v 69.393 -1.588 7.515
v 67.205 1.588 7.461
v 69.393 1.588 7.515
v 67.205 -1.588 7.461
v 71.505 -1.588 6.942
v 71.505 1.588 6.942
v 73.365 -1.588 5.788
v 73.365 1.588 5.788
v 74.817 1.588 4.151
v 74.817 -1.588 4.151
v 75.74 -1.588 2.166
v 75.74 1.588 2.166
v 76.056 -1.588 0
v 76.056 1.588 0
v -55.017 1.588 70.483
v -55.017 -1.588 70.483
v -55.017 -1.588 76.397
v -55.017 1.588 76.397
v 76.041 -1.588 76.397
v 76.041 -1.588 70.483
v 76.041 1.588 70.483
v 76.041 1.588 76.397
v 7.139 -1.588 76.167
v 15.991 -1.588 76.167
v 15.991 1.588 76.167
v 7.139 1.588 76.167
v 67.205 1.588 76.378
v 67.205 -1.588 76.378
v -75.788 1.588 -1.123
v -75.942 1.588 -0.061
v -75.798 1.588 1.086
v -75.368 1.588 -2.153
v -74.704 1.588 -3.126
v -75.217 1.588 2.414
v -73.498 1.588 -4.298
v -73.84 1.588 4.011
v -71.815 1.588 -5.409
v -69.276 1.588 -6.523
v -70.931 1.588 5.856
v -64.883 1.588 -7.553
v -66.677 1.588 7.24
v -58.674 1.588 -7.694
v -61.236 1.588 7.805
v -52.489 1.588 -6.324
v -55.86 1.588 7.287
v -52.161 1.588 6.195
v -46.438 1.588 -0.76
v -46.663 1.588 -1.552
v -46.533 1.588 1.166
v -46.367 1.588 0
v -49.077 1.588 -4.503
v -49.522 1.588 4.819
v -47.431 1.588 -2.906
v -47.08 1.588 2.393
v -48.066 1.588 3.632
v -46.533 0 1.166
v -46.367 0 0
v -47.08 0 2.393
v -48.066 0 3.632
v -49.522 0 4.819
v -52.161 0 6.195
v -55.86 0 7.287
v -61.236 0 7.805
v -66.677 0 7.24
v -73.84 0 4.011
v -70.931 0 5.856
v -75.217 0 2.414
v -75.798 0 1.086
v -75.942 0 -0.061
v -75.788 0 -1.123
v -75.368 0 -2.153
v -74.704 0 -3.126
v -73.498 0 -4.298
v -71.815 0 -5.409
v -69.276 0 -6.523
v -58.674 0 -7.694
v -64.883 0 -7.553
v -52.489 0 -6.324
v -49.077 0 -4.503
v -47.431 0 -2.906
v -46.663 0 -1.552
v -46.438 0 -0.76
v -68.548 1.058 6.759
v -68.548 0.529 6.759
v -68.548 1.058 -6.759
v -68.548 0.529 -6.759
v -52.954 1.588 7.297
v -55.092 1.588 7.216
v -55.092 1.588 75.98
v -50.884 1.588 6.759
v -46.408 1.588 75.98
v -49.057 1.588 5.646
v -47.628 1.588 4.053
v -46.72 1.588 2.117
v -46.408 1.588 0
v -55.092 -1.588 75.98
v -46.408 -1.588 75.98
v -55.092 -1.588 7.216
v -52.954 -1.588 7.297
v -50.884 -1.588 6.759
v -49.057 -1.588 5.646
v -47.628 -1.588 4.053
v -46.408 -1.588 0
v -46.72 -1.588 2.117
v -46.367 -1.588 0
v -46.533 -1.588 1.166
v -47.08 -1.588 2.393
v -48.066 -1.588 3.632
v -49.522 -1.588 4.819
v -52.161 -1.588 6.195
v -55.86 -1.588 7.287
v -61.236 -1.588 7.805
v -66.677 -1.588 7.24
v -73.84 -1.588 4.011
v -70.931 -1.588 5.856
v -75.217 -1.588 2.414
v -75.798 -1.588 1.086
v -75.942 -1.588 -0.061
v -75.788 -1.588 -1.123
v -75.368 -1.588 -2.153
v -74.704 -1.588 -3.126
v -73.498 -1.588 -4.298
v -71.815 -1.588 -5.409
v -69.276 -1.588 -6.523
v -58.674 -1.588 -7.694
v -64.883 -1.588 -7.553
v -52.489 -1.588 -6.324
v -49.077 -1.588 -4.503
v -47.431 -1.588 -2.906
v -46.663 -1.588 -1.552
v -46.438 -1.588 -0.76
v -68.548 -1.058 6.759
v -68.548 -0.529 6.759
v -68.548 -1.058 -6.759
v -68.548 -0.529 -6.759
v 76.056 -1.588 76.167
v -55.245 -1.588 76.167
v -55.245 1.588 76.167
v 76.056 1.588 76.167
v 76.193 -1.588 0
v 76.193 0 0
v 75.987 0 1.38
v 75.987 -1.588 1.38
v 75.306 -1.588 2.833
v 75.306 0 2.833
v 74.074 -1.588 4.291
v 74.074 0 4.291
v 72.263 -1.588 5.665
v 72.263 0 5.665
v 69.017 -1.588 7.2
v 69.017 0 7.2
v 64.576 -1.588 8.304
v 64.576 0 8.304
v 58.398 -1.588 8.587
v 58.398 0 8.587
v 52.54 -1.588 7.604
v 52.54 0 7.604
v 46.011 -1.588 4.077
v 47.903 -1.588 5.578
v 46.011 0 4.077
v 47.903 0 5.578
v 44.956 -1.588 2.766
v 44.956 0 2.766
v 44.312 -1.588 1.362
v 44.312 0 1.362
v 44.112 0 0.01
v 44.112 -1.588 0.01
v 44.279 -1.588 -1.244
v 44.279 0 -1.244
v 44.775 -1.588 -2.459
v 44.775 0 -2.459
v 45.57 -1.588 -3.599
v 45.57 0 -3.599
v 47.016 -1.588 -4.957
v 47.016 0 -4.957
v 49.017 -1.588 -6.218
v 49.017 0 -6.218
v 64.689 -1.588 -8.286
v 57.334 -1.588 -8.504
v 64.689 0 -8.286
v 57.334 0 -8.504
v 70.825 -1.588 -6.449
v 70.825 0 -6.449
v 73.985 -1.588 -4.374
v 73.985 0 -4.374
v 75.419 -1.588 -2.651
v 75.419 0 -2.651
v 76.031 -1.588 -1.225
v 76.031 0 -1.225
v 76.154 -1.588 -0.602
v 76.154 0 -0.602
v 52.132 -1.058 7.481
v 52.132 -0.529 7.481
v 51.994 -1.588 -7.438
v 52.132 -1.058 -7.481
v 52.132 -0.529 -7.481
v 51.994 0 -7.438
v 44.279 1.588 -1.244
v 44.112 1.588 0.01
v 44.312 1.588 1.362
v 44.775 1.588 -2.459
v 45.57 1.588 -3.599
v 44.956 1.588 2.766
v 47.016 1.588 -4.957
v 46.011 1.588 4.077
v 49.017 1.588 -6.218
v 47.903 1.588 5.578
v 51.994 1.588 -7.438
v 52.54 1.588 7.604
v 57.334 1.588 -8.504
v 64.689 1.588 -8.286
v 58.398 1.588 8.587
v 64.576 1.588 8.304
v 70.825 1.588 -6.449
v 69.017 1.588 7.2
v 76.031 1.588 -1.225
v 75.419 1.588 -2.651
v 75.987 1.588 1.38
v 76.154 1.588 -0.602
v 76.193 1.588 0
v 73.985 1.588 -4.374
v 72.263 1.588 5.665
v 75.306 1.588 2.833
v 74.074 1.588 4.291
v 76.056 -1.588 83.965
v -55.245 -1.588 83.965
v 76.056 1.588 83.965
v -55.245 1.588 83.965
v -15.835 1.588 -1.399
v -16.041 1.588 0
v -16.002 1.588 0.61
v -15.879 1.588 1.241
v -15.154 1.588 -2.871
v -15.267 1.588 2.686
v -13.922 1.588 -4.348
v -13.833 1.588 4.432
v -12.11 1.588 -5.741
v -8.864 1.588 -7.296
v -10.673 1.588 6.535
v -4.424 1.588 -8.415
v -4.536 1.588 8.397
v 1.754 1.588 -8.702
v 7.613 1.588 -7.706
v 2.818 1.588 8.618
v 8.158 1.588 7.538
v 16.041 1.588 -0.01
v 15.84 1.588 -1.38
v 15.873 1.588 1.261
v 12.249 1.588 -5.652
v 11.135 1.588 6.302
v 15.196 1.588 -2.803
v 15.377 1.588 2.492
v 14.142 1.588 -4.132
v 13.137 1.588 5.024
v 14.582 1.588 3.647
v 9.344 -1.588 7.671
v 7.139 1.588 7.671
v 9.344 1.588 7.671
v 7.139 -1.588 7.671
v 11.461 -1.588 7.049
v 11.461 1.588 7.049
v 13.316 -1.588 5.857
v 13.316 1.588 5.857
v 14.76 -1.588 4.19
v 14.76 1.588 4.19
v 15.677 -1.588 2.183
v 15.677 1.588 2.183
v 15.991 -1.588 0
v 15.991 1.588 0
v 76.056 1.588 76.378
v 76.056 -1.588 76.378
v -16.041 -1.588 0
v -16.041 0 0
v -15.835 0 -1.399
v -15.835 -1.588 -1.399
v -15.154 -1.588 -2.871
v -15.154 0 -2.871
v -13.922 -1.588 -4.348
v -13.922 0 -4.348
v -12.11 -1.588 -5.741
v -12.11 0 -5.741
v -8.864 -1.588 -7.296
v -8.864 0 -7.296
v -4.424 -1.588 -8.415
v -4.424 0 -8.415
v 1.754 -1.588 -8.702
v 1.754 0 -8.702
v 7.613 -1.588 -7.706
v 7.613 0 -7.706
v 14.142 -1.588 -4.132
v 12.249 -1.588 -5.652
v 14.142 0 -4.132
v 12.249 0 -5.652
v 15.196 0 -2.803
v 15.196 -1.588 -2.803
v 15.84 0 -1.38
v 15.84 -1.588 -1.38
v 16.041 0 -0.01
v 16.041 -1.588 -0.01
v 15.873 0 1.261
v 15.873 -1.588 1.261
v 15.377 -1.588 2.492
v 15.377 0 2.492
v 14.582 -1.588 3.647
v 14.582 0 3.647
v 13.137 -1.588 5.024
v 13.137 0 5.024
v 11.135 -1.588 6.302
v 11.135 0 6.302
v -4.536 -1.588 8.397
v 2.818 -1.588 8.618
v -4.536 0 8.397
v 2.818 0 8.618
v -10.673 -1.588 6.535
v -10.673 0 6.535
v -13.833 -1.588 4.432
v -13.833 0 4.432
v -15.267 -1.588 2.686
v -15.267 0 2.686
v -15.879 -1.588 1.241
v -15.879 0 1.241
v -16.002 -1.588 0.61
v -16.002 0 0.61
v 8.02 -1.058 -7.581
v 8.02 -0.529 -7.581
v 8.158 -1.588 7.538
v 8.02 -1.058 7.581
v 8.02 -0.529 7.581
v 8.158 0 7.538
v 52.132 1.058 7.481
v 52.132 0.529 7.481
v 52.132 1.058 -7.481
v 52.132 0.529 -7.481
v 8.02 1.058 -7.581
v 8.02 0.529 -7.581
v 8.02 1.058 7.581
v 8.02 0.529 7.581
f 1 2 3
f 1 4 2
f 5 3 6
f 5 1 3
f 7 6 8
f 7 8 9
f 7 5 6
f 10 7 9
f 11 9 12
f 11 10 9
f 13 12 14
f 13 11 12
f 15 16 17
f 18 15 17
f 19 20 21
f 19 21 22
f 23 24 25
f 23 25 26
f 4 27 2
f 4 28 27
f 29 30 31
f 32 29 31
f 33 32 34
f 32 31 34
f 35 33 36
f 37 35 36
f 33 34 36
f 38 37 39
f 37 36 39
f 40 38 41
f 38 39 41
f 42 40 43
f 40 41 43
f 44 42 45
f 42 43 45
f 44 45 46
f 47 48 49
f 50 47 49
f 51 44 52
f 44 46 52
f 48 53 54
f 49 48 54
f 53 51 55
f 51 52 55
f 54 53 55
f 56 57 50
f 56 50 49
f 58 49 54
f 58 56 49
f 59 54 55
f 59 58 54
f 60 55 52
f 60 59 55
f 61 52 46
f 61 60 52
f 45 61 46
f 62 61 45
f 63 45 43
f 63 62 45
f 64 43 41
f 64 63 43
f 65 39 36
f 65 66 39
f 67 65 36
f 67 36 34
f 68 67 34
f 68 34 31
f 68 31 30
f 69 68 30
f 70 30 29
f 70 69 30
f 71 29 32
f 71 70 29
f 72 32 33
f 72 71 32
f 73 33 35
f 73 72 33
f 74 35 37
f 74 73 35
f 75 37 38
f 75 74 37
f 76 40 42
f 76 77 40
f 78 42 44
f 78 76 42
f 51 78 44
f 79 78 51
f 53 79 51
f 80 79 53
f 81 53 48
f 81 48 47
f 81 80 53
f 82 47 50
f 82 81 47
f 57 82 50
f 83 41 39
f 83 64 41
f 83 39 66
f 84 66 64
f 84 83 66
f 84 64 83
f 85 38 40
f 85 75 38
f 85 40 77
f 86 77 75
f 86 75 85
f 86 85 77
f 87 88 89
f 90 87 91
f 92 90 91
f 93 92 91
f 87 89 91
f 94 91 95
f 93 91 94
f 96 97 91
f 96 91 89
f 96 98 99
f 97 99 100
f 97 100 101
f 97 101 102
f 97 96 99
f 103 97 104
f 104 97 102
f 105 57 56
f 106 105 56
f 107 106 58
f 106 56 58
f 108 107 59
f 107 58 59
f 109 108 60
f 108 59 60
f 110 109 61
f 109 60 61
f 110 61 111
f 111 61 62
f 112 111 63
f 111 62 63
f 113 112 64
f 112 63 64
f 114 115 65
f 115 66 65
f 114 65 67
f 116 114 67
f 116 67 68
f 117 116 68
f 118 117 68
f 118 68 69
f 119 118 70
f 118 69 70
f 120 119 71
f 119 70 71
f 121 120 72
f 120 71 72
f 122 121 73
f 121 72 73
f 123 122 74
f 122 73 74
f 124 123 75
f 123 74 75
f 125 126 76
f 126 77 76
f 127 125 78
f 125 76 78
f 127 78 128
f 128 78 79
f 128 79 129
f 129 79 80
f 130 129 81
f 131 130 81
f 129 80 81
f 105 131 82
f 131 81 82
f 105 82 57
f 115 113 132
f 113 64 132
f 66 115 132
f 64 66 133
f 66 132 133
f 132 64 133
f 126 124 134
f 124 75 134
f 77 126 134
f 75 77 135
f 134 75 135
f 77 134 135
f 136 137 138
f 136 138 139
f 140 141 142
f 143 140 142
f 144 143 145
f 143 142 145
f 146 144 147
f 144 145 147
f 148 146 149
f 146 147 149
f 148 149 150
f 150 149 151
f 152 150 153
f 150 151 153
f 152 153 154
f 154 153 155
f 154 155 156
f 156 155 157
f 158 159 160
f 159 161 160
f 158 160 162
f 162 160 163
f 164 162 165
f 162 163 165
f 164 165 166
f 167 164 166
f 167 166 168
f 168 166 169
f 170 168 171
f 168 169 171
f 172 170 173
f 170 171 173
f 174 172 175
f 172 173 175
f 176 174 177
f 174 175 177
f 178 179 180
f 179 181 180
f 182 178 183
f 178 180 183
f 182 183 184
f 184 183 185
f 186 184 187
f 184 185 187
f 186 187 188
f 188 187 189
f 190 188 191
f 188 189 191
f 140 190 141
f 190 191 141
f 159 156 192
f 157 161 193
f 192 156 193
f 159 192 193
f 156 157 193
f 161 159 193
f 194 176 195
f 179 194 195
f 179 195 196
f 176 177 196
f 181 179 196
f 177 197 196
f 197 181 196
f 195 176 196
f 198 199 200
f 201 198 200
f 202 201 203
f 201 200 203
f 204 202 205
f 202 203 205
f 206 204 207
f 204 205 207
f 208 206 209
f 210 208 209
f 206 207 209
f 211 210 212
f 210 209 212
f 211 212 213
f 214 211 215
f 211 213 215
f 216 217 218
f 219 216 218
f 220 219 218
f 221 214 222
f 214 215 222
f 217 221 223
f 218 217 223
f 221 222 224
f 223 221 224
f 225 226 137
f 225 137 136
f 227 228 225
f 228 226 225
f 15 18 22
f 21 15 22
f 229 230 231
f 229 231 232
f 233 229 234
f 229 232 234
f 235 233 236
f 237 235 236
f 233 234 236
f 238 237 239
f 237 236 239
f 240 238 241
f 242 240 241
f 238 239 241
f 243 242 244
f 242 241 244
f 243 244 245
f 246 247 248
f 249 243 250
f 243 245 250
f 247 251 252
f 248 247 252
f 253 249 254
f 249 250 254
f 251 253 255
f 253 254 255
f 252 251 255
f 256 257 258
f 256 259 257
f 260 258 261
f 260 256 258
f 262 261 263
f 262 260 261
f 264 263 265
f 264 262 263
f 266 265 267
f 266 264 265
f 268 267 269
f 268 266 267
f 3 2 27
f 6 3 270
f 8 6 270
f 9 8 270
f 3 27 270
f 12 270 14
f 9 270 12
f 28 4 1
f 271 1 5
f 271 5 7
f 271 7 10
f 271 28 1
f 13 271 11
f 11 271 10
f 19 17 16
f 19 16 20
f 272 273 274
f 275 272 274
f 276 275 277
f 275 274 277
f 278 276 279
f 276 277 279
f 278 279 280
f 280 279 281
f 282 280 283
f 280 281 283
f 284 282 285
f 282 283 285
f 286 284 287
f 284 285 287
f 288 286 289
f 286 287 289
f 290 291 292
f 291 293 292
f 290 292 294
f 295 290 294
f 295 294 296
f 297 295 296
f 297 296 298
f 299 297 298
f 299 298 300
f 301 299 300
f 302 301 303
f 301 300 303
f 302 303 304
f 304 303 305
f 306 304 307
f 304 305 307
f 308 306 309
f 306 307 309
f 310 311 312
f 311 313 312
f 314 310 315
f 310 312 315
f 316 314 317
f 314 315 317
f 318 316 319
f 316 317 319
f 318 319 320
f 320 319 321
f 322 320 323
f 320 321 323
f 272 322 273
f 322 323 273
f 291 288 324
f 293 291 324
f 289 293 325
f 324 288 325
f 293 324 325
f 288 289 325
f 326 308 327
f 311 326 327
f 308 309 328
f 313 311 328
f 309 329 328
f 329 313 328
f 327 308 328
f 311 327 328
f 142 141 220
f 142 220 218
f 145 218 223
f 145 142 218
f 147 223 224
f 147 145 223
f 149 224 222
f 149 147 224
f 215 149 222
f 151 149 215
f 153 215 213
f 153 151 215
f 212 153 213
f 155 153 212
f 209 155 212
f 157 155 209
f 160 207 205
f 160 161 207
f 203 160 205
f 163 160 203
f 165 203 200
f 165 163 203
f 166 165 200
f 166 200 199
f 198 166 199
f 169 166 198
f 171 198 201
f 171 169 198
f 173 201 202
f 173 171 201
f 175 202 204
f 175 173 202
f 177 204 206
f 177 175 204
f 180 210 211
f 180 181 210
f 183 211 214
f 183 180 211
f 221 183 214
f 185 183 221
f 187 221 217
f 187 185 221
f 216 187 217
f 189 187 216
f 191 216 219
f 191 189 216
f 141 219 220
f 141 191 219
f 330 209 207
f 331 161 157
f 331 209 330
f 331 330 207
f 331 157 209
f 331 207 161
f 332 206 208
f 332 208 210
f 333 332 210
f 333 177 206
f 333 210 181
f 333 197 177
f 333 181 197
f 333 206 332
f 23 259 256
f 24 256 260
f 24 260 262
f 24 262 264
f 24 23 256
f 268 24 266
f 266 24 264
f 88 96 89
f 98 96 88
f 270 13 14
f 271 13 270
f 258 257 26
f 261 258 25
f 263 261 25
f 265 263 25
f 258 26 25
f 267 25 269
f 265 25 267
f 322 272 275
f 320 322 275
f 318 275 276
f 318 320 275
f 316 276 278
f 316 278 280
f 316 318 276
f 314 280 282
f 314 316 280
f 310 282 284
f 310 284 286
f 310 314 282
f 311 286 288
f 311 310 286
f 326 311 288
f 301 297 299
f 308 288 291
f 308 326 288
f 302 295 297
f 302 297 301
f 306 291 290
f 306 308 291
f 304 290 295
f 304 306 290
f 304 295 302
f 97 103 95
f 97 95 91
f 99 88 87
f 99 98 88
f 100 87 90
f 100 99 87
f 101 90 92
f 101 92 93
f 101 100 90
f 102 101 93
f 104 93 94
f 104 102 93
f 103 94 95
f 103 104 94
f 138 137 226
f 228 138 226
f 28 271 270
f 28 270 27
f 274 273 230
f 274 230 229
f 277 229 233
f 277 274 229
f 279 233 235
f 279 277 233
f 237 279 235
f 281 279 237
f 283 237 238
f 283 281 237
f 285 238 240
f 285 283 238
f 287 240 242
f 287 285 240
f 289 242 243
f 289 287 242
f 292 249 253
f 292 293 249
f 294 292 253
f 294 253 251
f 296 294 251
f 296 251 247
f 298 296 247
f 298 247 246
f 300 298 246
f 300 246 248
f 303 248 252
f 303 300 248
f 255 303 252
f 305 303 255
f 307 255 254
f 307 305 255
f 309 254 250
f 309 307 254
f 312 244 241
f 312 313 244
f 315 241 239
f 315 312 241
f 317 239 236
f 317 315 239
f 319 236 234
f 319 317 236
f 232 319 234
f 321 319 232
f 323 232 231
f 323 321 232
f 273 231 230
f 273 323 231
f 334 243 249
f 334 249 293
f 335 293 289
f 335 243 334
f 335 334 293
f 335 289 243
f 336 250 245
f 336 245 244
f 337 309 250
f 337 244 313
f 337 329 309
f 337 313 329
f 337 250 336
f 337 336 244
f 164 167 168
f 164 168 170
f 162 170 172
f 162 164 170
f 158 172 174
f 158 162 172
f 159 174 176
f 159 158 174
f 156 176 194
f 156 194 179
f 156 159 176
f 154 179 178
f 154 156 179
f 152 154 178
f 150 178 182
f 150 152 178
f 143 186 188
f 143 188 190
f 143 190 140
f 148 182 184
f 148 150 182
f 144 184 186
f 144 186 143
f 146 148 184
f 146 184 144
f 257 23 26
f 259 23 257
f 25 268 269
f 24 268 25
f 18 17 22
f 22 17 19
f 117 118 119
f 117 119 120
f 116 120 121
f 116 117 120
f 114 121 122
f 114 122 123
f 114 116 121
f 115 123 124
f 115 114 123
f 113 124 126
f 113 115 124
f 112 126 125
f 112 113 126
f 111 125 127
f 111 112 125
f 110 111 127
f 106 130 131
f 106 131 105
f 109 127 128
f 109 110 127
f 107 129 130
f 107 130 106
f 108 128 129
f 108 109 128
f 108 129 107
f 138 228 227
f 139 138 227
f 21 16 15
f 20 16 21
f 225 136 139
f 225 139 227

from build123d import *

# Parameters (mm, degrees)
F8_DEPTH = 1.5875
F6_W     = 131.3017867506
F6_H     = 7.7980235219
F7_W     = 131.0581378639
F7_H     = 5.9141740203


with BuildPart() as f8:
    # F0 (on Front) → F8 (new body, symmetric)
    with BuildSketch(Plane.XZ):
        with BuildLine():
            add(Edge.make_bspline(
                [(-46.3673062623, 0), (-46.3673062623, 13.5182651888), (-68.5484204441, 6.7591325944), (-90.729534626, 0), (-68.5484204441, -6.7591325944), (-46.3673062623, -13.5182651888), (-46.3673062623, 0)],
                knots=[0, 0, 0, 2.0943951024, 2.0943951024, 4.1887902048, 4.1887902048, 6.2831853072, 6.2831853072, 6.2831853072], degree=2, weights=[1, 0.5, 1, 0.5, 1, 0.5, 1]))
        make_face()
    extrude(amount=F8_DEPTH, both=True)


with BuildPart() as f8b:
    # F1 (on Front) → F8, piece 2 (new body, symmetric)
    with BuildSketch(Plane.XZ):
        with BuildLine():
            add(Edge.make_bspline(
                [(76.1927515268, 0), (76.1927515268, 14.9627357177), (52.1318838, 7.4813678588), (28.0710160732, 0), (52.1318838, -7.4813678588), (76.1927515268, -14.9627357177), (76.1927515268, 0)],
                knots=[0, 0, 0, 2.0943951024, 2.0943951024, 4.1887902048, 4.1887902048, 6.2831853072, 6.2831853072, 6.2831853072], degree=2, weights=[1, 0.5, 1, 0.5, 1, 0.5, 1]))
        make_face()
    extrude(amount=F8_DEPTH, both=True)


with BuildPart() as f8c:
    # F2 (on Front) → F8, piece 3 (new body, symmetric)
    with BuildSketch(Plane.XZ):
        with BuildLine():
            add(Edge.make_bspline(
                [(-16.0405859351, 0), (-16.0405859351, -15.1629167296), (8.0202929676, -7.5814583648), (32.0811718702, 0), (8.0202929676, 7.5814583648), (-16.0405859351, 15.1629167296), (-16.0405859351, 0)],
                knots=[0, 0, 0, 2.0943951024, 2.0943951024, 4.1887902048, 4.1887902048, 6.2831853072, 6.2831853072, 6.2831853072], degree=2, weights=[1, 0.5, 1, 0.5, 1, 0.5, 1]))
        make_face()
    extrude(amount=F8_DEPTH, both=True)


with BuildPart() as f8d:
    # F3 (on Front) → F8, piece 4 (new body, symmetric)
    with BuildSketch(Plane.XZ):
        with BuildLine():
            ThreePointArc((-55.0922565162, 7.2164293379), (-49.0569604108, 5.6457103523), (-46.4078262448, 0))
            Line((-46.4078262448, 0), (-46.4078262448, 75.9797468781))
            Line((-46.4078262448, 75.9797468781), (-55.0922565162, 75.9797468781))
            Line((-55.0922565162, 75.9797468781), (-55.0922565162, 7.2164293379))
        make_face()
    extrude(amount=F8_DEPTH, both=True)


with BuildPart() as f8e:
    # F6 (on Front) → F8, piece 5 (new body, symmetric)
    with BuildSketch(Plane.XZ):
        with Locations((10.4054976255, 80.0664834678)):
            Rectangle(F6_W, F6_H)
    extrude(amount=F8_DEPTH, both=True)


with BuildPart() as f8f:
    # F4 (on Front) → F8, piece 6 (new body, symmetric)
    with BuildSketch(Plane.XZ):
        with BuildLine():
            ThreePointArc((7.1387621574, 7.6713589951), (13.3161757945, 5.8567088733), (15.9905645996, 0))
            Line((15.9905645996, 0), (15.9905645996, 76.1674717069))
            Line((15.9905645996, 76.1674717069), (7.1387621574, 76.1674717069))
            Line((7.1387621574, 76.1674717069), (7.1387621574, 7.6713589951))
        make_face()
    extrude(amount=F8_DEPTH, both=True)


with BuildPart() as f8g:
    # F5 (on Front) → F8, piece 7 (new body, symmetric)
    with BuildSketch(Plane.XZ):
        with BuildLine():
            ThreePointArc((67.2045871615, 7.4606025591), (73.3649925249, 5.7882428628), (76.0563910007, 0))
            Line((76.0563910007, 0), (76.0563910007, 76.3782337308))
            Line((76.0563910007, 76.3782337308), (67.2045871615, 76.3782337308))
            Line((67.2045871615, 76.3782337308), (67.2045871615, 7.4606025591))
        make_face()
    extrude(amount=F8_DEPTH, both=True)


with BuildPart() as f8h:
    # F7 (on Front) → F8, piece 8 (new body, symmetric)
    with BuildSketch(Plane.XZ):
        with Locations((10.5116833001, 73.4396092594)):
            Rectangle(F7_W, F7_H)
    extrude(amount=F8_DEPTH, both=True)


solid = Compound([f8.part, f8b.part, f8c.part, f8d.part, f8e.part, f8f.part, f8g.part, f8h.part])
